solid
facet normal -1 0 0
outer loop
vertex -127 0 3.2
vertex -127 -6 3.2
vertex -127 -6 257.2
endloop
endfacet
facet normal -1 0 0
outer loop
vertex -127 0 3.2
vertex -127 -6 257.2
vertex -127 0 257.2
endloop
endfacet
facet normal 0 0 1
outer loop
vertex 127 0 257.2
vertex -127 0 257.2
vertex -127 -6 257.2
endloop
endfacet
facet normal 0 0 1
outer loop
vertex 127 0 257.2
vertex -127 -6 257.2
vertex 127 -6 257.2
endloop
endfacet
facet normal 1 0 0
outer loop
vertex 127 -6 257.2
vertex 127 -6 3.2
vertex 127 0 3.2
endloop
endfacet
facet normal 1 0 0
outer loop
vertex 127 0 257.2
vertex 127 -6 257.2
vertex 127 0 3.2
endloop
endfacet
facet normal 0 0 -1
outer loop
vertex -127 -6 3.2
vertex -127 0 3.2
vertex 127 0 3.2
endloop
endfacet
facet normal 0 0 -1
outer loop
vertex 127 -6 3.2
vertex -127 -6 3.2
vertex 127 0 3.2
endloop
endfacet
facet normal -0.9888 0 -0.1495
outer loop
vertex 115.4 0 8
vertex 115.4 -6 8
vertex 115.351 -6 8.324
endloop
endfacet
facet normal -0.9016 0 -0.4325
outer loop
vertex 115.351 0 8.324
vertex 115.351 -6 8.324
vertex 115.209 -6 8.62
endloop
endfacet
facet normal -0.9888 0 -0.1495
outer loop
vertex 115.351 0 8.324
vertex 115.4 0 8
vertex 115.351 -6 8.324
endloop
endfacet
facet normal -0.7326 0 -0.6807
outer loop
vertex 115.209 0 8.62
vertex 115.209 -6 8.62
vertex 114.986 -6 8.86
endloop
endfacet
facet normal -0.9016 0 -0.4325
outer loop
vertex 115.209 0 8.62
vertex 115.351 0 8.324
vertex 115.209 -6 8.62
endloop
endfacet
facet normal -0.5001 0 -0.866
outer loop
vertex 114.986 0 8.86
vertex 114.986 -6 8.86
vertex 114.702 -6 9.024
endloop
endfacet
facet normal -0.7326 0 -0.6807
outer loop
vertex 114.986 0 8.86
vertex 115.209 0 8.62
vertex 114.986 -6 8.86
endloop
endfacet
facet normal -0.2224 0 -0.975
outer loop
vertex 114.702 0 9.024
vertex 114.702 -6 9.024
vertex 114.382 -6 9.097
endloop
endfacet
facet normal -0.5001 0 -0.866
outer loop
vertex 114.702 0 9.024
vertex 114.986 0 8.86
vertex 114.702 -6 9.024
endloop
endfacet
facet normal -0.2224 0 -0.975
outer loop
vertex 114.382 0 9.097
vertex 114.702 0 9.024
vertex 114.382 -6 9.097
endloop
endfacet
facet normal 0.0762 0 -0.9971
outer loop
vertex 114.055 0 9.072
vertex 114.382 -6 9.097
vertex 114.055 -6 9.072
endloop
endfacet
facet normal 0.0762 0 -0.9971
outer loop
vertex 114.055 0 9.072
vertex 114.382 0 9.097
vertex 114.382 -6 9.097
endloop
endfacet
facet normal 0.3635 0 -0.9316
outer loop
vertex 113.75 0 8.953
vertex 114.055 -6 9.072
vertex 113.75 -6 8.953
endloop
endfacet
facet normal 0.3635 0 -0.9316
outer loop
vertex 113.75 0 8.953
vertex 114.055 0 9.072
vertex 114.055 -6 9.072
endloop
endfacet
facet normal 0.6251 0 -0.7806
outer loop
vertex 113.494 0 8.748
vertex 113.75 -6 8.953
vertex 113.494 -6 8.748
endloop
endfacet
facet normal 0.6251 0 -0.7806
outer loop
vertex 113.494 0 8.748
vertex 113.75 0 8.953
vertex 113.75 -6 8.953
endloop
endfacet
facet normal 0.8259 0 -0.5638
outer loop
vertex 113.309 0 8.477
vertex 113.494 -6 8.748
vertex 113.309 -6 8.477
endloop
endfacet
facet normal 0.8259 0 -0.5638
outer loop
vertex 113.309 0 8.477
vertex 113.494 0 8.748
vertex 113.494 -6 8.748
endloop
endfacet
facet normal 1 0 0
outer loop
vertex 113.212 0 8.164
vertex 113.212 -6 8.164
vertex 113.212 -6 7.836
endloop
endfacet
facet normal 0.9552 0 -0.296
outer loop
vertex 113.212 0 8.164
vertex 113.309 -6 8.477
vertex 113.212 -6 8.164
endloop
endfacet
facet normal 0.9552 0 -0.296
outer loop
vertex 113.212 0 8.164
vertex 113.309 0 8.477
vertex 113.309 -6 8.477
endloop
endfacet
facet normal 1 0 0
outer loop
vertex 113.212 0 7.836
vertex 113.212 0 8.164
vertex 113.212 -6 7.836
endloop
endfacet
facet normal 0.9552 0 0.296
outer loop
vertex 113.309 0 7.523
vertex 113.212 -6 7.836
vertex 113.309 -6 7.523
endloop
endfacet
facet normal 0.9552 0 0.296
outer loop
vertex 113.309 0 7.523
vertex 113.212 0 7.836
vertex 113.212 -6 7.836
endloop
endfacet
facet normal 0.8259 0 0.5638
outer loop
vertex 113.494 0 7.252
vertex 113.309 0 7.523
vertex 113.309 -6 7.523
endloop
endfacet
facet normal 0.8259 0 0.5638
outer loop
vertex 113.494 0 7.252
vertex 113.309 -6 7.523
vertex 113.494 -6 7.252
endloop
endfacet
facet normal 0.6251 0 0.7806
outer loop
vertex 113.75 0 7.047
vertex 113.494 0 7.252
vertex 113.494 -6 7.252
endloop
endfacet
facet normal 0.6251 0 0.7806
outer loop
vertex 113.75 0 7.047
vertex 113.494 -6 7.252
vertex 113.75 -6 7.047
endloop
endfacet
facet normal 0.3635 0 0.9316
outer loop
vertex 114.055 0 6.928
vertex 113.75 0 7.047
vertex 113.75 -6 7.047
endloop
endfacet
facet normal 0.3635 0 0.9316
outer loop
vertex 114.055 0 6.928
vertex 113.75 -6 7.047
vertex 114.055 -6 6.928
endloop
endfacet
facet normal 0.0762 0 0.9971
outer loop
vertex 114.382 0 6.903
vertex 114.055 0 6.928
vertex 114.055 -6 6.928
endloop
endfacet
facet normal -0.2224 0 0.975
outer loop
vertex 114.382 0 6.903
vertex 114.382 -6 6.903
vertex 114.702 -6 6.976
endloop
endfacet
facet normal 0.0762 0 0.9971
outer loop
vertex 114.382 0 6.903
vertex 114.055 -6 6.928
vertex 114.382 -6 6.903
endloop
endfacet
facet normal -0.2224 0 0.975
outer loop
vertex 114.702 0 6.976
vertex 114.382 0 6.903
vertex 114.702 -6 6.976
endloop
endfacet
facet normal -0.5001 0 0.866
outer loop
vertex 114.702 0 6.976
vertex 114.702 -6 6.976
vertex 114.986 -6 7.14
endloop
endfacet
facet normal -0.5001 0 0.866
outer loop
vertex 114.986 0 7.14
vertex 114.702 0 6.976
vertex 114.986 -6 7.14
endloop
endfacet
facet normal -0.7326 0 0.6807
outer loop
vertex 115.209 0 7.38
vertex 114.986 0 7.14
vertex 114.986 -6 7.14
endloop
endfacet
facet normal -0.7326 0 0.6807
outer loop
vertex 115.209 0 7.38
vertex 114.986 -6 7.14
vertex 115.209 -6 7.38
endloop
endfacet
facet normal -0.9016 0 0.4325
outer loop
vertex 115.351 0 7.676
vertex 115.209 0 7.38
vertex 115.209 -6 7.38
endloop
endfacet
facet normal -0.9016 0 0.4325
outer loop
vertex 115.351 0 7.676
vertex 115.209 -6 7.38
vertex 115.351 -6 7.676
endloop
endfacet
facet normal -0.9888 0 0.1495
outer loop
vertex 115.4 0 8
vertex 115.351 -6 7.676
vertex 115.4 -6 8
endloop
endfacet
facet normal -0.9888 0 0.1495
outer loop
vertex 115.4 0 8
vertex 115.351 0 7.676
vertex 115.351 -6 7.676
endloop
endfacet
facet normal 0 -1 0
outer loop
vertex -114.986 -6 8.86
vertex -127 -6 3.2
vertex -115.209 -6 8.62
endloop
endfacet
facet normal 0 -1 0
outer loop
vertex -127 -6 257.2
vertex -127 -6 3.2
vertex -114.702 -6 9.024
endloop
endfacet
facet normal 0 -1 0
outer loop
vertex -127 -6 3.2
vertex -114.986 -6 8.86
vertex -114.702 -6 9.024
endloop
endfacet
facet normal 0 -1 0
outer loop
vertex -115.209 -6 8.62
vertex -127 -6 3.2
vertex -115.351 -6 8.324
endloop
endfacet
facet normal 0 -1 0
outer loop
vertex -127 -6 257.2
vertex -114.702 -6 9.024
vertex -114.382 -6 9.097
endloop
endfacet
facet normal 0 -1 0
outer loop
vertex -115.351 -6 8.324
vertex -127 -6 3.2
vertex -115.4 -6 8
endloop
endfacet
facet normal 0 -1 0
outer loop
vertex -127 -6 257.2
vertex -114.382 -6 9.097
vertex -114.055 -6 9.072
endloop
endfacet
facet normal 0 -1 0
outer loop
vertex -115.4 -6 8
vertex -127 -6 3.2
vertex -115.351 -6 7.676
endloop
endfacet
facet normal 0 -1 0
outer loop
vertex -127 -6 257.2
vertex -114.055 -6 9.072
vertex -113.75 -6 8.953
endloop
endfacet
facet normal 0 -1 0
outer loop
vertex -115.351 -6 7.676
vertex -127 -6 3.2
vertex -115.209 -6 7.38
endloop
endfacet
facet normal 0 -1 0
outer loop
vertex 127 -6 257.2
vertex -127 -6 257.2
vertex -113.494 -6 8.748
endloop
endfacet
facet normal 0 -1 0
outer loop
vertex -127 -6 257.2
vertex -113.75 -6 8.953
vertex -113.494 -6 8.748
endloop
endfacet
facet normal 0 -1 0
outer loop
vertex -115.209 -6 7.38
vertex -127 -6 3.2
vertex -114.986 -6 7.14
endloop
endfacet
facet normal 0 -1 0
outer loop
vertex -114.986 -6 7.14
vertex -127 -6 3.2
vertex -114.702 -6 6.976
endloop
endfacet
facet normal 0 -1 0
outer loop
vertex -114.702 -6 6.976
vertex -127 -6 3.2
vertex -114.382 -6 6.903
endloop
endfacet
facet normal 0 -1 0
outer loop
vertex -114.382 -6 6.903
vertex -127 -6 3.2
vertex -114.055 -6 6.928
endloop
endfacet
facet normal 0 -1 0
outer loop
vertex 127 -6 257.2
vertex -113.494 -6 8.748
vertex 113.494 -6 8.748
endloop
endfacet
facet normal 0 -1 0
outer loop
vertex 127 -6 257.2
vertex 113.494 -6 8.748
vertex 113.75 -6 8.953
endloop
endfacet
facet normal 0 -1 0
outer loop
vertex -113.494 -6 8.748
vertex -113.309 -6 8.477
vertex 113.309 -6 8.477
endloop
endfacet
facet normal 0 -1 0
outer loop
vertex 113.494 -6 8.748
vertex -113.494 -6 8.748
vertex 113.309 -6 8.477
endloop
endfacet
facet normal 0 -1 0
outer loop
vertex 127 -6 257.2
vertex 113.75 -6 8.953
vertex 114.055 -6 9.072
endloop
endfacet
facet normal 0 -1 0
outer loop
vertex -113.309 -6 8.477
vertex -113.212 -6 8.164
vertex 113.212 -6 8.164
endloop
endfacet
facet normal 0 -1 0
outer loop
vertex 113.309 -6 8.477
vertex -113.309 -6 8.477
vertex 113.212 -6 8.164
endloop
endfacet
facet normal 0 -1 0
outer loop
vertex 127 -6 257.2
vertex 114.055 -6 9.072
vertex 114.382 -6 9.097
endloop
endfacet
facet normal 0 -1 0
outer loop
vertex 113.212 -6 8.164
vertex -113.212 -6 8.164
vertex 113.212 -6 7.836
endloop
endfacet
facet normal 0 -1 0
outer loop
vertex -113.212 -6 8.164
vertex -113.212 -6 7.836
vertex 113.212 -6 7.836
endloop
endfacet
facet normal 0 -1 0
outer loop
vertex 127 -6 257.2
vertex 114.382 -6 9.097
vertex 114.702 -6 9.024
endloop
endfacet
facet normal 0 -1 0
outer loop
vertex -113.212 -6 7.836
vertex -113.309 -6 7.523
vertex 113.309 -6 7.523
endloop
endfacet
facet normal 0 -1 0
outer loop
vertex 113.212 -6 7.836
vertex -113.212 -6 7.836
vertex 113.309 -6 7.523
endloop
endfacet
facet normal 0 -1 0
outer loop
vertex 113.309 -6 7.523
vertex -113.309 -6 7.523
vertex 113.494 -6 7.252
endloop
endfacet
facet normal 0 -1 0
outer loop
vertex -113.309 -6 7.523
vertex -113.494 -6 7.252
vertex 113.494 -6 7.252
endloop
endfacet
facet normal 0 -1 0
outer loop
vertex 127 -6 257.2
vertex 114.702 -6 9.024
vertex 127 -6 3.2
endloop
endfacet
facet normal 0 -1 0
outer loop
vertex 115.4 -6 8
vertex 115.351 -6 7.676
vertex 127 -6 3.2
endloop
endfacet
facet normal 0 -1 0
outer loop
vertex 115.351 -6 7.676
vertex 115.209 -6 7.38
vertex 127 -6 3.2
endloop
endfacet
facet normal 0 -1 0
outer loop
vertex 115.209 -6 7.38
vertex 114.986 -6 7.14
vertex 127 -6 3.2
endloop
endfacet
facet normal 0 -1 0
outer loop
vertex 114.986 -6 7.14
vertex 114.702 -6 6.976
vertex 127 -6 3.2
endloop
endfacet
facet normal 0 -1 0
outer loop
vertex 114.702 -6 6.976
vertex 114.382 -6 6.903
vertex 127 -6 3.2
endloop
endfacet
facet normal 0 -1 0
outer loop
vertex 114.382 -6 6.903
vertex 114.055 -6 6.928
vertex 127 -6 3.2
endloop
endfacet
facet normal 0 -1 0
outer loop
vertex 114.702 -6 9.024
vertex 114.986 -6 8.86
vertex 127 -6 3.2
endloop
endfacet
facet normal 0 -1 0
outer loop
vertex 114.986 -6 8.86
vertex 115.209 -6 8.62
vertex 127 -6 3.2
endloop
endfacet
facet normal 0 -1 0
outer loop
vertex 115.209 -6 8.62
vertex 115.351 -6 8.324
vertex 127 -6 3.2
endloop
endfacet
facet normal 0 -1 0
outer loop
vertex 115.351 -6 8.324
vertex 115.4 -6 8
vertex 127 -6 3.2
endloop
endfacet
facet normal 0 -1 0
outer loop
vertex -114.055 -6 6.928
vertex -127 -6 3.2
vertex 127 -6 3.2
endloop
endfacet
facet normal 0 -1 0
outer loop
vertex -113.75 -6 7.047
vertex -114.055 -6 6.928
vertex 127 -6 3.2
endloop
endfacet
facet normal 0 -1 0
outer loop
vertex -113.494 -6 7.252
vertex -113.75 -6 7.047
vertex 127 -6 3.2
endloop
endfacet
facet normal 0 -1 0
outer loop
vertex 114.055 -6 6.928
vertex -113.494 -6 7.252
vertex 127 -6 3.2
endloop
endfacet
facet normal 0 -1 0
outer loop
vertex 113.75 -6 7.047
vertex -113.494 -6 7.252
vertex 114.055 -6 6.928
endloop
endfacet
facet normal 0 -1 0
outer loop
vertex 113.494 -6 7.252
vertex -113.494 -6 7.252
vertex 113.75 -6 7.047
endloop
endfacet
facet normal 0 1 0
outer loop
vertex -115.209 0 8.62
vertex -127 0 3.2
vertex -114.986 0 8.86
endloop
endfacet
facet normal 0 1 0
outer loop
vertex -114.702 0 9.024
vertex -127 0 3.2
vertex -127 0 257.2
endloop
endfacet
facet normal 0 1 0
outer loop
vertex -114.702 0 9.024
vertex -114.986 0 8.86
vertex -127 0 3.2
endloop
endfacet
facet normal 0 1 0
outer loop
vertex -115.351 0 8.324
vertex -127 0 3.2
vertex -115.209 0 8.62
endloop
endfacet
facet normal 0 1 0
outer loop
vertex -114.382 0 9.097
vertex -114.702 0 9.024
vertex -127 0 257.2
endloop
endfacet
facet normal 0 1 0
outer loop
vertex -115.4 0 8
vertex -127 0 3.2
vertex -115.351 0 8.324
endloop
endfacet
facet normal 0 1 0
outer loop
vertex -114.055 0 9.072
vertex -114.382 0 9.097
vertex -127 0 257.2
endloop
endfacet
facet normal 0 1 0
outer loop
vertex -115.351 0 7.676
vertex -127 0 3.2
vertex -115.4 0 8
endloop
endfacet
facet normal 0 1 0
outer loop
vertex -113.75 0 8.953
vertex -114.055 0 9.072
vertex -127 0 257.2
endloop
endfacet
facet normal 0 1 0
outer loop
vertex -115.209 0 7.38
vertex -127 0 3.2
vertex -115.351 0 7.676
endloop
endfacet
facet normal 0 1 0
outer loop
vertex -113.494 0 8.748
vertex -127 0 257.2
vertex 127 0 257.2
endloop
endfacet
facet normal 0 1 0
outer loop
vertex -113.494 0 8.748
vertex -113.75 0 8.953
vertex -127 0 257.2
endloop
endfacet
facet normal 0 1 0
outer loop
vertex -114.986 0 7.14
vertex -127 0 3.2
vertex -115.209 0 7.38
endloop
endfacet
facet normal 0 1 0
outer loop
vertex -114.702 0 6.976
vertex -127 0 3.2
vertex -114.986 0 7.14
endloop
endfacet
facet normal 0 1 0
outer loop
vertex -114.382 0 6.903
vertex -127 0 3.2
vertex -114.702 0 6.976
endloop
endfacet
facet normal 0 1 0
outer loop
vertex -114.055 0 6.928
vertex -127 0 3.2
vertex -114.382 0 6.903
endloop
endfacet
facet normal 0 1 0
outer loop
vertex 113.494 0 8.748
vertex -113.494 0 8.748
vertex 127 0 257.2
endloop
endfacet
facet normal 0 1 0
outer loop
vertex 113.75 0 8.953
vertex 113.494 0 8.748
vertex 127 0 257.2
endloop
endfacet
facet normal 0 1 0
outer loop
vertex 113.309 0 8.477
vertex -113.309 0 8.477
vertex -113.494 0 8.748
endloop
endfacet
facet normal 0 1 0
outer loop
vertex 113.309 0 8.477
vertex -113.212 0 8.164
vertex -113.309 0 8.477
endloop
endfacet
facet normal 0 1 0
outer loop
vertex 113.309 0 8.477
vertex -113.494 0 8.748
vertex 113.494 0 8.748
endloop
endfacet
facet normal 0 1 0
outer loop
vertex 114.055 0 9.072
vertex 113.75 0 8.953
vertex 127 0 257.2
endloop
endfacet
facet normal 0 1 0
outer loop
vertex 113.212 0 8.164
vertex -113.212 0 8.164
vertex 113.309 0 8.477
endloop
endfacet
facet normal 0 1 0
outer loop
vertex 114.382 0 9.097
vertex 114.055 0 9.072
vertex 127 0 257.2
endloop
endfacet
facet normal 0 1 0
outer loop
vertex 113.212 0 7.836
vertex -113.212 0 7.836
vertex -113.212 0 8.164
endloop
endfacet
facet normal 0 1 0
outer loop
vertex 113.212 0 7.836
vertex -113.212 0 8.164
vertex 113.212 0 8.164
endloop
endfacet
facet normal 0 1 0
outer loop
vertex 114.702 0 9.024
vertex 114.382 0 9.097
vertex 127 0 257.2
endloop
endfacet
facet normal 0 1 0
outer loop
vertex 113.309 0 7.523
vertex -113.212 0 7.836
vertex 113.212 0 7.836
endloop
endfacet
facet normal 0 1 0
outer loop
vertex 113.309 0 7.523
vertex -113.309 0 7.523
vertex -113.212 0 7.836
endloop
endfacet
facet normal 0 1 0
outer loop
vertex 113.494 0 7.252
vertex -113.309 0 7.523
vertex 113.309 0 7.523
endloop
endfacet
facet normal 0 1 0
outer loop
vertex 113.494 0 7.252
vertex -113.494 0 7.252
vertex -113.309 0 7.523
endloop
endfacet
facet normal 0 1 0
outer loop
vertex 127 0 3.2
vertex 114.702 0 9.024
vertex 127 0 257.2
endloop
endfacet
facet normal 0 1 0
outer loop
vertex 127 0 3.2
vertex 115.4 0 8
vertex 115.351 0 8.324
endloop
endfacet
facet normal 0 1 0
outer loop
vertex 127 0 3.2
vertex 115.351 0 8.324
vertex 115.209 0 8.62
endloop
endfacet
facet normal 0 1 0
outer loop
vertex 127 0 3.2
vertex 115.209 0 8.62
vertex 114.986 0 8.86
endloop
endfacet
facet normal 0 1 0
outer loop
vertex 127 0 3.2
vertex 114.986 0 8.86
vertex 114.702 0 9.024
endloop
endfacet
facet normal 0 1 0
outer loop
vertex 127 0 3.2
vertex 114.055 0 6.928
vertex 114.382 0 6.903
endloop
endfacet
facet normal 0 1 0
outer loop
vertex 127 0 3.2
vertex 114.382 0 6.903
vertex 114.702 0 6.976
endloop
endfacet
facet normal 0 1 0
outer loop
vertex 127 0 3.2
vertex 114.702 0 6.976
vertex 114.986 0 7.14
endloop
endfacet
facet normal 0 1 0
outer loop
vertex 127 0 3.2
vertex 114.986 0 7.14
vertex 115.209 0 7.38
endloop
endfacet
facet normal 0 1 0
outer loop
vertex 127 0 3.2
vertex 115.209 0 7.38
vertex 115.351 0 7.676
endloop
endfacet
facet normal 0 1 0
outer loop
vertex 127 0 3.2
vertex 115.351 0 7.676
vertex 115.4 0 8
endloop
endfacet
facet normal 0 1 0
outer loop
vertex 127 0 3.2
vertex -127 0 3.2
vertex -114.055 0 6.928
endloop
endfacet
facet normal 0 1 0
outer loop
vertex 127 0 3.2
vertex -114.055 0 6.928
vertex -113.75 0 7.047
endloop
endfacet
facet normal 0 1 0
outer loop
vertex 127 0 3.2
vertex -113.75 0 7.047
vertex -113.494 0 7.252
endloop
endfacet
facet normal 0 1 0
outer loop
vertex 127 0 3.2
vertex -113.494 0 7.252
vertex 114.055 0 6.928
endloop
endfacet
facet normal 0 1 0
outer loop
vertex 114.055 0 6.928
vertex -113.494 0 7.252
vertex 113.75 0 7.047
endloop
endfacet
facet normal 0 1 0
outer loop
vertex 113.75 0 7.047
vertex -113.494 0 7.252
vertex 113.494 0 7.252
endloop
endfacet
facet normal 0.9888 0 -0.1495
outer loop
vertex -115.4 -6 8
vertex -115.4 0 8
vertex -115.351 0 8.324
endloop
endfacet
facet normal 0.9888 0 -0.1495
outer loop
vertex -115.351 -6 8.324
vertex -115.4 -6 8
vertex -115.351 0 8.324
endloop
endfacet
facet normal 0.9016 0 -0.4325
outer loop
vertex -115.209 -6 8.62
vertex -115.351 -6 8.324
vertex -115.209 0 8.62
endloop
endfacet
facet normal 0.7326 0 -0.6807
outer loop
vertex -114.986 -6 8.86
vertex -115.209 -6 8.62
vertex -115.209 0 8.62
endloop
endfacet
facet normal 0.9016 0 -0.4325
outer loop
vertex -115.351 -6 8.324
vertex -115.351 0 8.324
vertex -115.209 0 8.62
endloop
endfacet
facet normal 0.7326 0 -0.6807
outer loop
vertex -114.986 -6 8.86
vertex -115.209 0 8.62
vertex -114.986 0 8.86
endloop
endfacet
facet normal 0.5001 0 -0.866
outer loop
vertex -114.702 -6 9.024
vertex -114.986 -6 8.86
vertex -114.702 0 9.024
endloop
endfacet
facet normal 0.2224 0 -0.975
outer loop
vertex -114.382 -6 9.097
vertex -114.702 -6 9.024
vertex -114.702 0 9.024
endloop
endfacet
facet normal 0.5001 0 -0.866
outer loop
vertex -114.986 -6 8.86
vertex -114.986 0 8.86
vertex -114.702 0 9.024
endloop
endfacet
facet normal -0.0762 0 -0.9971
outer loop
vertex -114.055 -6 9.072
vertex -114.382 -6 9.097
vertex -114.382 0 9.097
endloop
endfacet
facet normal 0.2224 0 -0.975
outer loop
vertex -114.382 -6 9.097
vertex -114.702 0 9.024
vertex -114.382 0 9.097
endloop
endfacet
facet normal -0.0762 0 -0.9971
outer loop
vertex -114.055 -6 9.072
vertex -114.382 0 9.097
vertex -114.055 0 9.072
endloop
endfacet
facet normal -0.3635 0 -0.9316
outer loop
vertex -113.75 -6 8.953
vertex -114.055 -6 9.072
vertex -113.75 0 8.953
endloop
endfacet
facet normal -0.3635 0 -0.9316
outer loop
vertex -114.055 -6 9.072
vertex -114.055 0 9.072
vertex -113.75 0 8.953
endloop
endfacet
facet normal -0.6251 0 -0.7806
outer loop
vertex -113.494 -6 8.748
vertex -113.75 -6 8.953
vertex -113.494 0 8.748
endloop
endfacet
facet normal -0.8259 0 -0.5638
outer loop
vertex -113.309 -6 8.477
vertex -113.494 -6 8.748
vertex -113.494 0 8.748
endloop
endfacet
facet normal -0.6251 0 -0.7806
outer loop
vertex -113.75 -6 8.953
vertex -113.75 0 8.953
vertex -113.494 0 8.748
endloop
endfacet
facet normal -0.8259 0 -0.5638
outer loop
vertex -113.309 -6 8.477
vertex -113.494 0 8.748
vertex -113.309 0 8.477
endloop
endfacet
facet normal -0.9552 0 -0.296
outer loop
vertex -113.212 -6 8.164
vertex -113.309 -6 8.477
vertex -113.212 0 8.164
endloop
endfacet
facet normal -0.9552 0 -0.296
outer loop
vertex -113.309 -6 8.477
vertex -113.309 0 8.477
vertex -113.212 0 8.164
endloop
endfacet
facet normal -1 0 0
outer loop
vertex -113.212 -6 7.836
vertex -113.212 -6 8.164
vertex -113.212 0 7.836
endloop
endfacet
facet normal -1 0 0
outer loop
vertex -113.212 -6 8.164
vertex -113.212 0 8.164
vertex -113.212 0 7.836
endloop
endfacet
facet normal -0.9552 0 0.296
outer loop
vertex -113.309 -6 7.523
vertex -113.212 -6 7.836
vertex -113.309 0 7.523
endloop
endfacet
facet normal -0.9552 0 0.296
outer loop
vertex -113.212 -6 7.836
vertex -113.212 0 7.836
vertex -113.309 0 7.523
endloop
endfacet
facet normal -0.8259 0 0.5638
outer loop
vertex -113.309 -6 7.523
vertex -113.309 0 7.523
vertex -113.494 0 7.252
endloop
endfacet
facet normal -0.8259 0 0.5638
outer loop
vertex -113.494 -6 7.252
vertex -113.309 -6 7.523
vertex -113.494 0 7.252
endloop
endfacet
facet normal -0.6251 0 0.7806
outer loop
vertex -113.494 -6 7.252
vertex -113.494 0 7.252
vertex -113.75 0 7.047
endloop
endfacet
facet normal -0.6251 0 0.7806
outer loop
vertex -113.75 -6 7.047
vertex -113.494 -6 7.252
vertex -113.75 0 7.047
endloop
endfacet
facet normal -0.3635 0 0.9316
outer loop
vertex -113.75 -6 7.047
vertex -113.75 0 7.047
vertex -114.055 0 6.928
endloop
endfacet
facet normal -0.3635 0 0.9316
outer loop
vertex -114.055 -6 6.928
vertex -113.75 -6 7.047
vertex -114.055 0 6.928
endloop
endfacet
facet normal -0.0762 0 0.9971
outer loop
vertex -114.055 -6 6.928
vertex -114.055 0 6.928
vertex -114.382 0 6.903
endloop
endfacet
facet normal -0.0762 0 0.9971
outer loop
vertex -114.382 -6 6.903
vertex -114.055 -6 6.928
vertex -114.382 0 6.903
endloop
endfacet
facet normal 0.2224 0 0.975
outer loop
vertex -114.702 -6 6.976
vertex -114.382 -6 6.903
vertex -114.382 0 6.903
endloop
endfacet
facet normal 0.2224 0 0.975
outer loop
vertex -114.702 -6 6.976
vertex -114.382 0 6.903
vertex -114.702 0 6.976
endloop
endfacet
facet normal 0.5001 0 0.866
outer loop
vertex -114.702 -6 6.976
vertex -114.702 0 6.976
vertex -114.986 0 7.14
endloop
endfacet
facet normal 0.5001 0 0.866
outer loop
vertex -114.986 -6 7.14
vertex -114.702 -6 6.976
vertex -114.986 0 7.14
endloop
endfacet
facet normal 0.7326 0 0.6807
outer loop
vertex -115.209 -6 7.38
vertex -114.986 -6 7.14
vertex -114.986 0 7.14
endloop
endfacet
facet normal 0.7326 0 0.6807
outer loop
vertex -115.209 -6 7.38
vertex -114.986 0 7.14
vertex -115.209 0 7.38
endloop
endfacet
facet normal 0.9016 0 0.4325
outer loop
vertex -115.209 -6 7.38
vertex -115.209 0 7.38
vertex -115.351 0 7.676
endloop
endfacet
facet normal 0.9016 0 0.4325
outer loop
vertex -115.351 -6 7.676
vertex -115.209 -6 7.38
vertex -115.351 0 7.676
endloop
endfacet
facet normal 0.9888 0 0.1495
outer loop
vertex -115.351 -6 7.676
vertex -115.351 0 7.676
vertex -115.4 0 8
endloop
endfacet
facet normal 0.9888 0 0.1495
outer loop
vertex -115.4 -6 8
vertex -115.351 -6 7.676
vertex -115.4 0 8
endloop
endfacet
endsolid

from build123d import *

# Parameters (mm, degrees)
SKETCH002_W     = 254
SKETCH002_H     = 6
PAD002_DEPTH    = 254
SKETCH035_R     = 1.1
POCKET006_DEPTH = 724.521703


with BuildPart() as part:
    # Sketch002 → Pad002 (new body)
    with BuildSketch(Plane.XY.offset(1.6)):
        with Locations((0, 3)):
            Rectangle(SKETCH002_W, SKETCH002_H)
    extrude(amount=PAD002_DEPTH)

    # Sketch035 (on Face1 of Pad002) → Pocket006 (cut, through all)
    with BuildSketch(Plane(origin=(0, 6, 0), x_dir=(-1, 0, 0), z_dir=(0, 1, 0))):
        with Locations((114.3, 6.4)):
            Circle(SKETCH035_R)
    pocket006 = extrude(amount=-POCKET006_DEPTH, mode=Mode.SUBTRACT)

    # Mirrored: Pocket006 across Sketch035 V_Axis
    add(pocket006.mirror(Plane(origin=(0, 6, 0), x_dir=(0, 1, 0), z_dir=(-1, 0, 0))), mode=Mode.SUBTRACT)


with BuildPart() as part_1:
    # Body002 placement: moved
    add(part.part.moved(Location((0, -6, 1.6))))


solid = part_1.part
